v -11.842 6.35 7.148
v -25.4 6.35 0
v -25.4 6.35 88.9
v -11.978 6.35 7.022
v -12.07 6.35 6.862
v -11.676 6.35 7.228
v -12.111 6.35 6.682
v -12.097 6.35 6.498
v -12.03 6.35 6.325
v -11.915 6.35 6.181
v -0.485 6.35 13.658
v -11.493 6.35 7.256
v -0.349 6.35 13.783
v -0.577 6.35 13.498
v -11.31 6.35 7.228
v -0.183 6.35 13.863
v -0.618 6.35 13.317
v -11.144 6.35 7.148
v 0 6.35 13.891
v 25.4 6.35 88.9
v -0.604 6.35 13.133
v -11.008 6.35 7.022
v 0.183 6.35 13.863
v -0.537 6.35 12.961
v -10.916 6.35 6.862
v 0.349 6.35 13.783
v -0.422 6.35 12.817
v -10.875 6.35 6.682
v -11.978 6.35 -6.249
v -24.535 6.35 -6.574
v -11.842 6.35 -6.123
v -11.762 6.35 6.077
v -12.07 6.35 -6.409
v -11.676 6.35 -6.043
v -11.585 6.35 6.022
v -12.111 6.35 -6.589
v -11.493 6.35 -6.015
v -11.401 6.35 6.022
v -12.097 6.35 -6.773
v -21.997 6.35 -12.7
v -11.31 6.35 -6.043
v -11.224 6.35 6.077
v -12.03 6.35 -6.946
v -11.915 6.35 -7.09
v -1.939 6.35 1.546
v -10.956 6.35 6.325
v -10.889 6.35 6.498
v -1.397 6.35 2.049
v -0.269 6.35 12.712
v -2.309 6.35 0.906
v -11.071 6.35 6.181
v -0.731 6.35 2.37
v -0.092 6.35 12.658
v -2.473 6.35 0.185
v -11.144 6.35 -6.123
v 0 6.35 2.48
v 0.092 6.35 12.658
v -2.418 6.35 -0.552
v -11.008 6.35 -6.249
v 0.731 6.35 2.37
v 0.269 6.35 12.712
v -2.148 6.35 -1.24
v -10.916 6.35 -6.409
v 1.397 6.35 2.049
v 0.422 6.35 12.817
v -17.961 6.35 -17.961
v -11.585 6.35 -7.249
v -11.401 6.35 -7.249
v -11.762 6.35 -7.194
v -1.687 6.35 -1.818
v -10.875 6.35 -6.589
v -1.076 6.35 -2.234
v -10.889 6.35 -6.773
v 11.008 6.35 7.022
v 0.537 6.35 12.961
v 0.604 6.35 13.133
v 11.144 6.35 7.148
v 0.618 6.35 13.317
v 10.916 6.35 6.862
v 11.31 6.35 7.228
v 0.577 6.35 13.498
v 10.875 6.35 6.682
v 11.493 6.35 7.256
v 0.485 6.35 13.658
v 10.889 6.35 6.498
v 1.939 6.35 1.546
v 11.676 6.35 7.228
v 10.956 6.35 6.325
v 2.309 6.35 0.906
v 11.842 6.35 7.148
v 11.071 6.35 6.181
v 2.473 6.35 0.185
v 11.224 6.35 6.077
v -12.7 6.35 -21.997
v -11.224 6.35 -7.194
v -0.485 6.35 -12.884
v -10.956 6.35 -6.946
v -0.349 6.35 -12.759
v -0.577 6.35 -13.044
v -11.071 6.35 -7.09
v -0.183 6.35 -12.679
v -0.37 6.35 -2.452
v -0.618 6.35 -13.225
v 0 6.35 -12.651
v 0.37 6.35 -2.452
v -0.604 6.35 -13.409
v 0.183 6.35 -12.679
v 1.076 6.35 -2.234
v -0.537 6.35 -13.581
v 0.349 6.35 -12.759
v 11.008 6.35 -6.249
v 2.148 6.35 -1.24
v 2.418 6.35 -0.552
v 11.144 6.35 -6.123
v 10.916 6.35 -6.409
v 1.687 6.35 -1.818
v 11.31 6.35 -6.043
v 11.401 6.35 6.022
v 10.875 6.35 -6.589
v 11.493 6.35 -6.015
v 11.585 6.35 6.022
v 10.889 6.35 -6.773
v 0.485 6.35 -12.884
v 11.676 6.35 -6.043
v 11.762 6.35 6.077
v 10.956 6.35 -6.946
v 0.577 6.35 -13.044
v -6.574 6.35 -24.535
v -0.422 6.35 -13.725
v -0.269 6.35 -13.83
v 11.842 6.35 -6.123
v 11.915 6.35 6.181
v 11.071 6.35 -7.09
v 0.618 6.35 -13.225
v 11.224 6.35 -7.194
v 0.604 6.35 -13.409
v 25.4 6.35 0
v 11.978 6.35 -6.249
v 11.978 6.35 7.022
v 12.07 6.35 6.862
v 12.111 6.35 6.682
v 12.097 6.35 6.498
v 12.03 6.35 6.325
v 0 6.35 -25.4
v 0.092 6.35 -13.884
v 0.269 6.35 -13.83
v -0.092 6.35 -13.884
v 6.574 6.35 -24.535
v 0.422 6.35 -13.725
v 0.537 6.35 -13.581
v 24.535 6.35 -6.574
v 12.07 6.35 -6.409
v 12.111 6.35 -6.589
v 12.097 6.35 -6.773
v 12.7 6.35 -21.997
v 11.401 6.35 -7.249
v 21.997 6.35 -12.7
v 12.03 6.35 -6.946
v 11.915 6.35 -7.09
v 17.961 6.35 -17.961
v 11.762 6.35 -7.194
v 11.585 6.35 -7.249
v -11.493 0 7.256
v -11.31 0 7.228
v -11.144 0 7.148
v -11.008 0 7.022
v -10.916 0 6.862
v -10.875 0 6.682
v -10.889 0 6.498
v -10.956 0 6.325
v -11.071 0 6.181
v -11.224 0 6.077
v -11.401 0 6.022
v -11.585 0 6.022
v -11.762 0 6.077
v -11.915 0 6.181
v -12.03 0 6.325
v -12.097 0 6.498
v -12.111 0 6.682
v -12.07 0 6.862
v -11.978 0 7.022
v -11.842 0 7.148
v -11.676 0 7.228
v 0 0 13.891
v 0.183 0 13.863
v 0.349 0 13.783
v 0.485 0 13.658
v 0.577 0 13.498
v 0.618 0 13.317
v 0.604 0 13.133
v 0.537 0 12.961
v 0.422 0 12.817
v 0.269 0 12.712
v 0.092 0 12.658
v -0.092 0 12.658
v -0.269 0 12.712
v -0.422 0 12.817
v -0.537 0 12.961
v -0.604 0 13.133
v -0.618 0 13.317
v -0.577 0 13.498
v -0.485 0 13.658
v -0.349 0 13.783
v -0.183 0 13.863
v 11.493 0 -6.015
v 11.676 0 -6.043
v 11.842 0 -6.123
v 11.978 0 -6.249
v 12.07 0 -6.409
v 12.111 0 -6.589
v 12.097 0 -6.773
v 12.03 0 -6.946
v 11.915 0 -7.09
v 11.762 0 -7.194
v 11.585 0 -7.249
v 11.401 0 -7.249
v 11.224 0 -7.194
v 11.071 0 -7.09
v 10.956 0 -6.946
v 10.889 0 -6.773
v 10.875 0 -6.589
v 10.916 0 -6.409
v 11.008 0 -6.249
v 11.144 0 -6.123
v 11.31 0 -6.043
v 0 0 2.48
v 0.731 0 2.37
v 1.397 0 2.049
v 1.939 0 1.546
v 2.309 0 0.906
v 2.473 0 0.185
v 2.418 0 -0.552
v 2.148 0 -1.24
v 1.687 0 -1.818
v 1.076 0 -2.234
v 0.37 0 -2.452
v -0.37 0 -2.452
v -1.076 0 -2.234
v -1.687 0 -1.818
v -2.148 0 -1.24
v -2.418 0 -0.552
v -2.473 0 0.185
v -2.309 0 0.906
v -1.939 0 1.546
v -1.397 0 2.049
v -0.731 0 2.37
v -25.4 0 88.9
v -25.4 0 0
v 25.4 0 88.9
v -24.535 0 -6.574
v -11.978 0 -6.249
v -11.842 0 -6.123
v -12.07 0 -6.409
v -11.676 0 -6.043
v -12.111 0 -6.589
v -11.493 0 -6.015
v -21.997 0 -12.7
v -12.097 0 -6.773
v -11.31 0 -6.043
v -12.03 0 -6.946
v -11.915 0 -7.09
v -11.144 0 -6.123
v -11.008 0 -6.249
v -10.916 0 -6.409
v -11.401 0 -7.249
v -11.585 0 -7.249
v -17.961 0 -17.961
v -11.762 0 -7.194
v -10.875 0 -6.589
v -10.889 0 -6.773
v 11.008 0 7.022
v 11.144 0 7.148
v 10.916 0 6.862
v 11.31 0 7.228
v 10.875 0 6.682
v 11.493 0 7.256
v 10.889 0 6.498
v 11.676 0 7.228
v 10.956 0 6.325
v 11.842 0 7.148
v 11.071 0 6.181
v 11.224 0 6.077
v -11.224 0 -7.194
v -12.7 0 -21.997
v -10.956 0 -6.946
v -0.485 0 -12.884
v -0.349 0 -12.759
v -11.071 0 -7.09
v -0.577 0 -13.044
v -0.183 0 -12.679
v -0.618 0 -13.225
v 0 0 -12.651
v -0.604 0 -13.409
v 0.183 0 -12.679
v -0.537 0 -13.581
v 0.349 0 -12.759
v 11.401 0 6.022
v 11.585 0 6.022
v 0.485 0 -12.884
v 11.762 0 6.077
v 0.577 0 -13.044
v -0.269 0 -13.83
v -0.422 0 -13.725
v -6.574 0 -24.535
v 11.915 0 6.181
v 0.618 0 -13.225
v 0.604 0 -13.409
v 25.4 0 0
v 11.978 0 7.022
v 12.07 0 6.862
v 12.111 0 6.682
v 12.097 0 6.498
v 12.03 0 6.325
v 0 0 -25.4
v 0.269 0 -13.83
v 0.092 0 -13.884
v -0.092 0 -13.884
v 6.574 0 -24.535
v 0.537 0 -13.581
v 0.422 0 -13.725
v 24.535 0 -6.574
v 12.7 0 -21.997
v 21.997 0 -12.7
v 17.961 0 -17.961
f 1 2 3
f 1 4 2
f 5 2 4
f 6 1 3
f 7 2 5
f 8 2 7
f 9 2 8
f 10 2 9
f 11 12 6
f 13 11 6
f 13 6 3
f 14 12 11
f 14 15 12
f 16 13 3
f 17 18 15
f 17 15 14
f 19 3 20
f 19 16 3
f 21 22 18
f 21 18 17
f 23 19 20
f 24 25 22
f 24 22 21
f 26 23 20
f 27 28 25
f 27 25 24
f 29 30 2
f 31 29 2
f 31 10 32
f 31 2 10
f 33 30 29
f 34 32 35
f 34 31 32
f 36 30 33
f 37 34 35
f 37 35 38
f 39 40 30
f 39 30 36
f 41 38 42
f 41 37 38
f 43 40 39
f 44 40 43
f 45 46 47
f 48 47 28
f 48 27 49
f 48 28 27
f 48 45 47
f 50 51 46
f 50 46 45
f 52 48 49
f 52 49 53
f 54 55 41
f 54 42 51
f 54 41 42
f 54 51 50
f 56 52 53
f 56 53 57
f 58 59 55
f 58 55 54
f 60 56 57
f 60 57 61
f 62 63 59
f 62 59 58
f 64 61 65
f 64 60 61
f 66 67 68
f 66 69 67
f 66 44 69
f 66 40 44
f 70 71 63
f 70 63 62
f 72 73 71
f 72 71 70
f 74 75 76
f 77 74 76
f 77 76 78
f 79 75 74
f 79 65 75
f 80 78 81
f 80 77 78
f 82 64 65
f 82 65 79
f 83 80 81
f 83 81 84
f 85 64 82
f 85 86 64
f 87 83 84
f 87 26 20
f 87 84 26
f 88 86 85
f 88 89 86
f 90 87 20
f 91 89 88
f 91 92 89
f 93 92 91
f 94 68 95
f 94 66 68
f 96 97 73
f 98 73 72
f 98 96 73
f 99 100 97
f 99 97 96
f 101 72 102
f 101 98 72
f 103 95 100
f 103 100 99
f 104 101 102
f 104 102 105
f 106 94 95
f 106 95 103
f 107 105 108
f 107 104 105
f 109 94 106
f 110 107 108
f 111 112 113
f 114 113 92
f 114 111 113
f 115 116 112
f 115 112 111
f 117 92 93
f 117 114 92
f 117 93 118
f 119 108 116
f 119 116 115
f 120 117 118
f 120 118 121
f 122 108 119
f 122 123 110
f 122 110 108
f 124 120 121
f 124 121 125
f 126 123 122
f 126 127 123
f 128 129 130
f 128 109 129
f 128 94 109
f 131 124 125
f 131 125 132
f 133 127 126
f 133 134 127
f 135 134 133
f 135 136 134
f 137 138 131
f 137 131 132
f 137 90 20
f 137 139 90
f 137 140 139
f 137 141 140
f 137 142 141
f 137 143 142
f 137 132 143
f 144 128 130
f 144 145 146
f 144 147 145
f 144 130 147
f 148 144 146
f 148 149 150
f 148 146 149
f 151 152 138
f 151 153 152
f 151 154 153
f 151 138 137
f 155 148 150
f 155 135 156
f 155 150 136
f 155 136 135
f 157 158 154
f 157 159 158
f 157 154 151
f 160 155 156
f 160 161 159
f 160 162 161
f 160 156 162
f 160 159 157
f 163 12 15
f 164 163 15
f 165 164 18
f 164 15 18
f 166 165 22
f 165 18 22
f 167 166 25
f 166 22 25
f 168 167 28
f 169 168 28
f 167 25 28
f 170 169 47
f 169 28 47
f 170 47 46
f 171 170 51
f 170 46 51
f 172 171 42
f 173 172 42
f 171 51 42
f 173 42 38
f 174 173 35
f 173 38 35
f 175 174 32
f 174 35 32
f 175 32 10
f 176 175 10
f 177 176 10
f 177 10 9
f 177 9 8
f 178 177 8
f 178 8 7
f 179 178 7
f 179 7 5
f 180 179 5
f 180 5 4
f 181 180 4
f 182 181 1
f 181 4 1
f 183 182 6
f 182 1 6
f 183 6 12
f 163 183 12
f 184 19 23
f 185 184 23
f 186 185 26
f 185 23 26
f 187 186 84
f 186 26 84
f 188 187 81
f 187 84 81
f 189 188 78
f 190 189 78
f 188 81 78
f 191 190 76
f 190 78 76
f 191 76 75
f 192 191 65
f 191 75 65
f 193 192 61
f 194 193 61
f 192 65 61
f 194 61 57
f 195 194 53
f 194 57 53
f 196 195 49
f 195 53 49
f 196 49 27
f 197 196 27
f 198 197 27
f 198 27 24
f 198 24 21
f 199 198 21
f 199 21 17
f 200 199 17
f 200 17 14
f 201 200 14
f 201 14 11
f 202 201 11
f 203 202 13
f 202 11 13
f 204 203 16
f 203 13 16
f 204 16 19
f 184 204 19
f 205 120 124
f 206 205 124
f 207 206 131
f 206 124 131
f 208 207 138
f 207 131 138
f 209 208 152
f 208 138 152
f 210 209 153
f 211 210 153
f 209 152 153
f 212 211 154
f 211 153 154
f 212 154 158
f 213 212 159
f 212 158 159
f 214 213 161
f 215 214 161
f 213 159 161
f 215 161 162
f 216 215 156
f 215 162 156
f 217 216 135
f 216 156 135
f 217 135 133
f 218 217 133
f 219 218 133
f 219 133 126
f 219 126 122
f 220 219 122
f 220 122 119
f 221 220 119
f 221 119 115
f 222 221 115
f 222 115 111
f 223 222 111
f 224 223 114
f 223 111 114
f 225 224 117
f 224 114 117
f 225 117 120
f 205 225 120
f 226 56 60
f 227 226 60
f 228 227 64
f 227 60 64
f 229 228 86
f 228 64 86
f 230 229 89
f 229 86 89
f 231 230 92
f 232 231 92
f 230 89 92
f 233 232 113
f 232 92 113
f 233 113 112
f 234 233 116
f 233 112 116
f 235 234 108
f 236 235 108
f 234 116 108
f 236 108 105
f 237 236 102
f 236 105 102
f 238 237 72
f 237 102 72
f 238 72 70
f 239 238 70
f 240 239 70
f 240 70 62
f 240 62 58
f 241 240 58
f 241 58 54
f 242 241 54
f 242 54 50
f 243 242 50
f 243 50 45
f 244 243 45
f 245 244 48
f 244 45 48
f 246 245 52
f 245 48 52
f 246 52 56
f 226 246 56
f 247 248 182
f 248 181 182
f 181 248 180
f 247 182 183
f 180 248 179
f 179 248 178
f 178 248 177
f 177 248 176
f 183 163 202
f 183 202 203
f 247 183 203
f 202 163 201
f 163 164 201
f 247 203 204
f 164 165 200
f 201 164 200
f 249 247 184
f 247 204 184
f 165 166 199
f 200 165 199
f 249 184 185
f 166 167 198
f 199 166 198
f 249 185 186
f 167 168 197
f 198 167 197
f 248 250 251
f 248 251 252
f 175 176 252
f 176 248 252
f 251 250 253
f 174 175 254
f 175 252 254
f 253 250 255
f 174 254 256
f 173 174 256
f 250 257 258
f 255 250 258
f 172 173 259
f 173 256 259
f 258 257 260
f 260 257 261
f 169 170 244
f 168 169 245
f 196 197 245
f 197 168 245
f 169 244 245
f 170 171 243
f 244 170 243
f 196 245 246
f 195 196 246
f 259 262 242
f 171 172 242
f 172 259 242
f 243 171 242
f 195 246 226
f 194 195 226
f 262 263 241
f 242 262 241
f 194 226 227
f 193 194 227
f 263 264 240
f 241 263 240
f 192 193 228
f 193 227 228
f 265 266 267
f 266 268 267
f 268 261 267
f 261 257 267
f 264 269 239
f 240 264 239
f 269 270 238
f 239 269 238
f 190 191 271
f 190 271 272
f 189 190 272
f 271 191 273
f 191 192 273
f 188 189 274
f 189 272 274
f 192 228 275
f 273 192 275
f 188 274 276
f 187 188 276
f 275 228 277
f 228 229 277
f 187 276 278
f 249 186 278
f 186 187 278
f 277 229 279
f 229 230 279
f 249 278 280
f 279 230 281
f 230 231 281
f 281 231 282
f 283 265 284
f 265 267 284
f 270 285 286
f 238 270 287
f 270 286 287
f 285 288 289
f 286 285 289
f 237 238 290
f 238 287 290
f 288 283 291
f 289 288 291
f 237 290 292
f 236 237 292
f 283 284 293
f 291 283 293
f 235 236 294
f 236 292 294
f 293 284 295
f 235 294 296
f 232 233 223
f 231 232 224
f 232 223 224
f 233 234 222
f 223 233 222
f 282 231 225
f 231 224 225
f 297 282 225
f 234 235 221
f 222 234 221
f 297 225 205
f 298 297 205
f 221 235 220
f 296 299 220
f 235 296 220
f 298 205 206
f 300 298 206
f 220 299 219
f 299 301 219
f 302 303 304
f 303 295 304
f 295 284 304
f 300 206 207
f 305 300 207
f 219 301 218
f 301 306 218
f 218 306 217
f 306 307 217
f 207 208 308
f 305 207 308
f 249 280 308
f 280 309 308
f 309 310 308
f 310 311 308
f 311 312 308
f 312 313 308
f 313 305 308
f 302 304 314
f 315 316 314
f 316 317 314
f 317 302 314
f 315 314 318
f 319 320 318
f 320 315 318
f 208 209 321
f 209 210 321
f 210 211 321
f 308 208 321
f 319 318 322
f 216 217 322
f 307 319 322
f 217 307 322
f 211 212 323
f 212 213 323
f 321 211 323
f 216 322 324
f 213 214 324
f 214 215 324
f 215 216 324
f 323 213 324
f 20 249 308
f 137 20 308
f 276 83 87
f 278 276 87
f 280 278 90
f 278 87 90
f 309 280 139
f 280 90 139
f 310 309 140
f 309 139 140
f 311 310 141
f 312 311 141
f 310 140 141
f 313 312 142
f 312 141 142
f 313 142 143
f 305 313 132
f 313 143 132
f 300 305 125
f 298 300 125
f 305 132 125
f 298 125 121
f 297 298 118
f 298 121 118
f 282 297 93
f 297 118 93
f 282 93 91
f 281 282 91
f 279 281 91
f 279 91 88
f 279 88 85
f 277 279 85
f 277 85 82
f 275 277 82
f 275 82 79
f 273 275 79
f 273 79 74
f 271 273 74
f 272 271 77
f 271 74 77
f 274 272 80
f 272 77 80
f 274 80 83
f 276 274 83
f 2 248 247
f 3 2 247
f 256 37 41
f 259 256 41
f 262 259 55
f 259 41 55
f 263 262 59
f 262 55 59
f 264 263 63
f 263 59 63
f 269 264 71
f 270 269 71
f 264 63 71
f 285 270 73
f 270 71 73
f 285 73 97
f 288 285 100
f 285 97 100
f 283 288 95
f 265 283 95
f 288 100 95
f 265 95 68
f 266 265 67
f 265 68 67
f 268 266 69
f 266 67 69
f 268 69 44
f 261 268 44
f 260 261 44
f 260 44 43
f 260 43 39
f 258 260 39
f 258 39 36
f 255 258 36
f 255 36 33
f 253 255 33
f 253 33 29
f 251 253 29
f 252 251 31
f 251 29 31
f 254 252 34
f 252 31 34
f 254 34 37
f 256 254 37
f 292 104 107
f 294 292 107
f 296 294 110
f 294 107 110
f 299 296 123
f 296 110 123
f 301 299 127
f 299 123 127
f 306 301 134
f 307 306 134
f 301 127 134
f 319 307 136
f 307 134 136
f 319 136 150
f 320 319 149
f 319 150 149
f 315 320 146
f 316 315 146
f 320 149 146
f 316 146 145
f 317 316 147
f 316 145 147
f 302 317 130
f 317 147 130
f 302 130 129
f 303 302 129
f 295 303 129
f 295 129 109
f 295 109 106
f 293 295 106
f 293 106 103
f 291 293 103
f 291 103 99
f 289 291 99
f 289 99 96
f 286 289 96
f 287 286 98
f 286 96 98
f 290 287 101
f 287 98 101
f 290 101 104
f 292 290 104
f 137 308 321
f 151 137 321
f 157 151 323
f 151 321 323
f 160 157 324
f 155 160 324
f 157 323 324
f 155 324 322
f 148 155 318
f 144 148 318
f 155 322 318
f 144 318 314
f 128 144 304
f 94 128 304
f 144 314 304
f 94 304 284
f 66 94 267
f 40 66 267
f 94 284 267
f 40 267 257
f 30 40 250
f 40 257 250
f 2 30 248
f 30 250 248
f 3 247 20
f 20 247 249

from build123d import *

# Parameters (mm, degrees)
BOSS_EXTRUDE1_DEPTH = 6.35
SKETCH2_R           = 0.62000003
CUT_EXTRUDE1_DEPTH  = 6.35
SKETCH3_R           = 2.480100005
CUT_EXTRUDE2_DEPTH  = 6.35


with BuildPart() as part:
    # Sketch1 → Boss-Extrude1 (new body)
    with BuildSketch(Plane(origin=(0, 0, 0), x_dir=(1, 0, 0), z_dir=(0, 1, 0))):
        with BuildLine():
            Line((-25.4, 0), (-25.4, -88.9))
            Line((-25.4, -88.9), (25.4, -88.9))
            Line((25.4, -88.9), (25.4, 0))
            ThreePointArc((25.4, 0), (0, 25.4), (-25.4, 0))
        make_face()
    extrude(amount=BOSS_EXTRUDE1_DEPTH)

    # Sketch2 → Cut-Extrude1 (cut)
    with BuildSketch(Plane(origin=(0, 6.35, 0), x_dir=(1, 0, 0), z_dir=(0, 1, 0))):
        with Locations(Location((0, 13.271000001, 0), (0, 0, 270))):
            Circle(SKETCH2_R)
        with Locations(Location((0, -13.271000001, 0), (0, 0, 270))):
            Circle(SKETCH2_R)
        with Locations(Location((-11.493023134, 6.635500001, 0), (0, 0, 270))):
            Circle(SKETCH2_R)
        with Locations(Location((-11.493023134, -6.635500001, 0), (0, 0, 270))):
            Circle(SKETCH2_R)
        with Locations(Location((11.493023134, 6.635500001, 0), (0, 0, 270))):
            Circle(SKETCH2_R)
        with Locations(Location((11.493023134, -6.635500001, 0), (0, 0, 270))):
            Circle(SKETCH2_R)
    extrude(amount=-CUT_EXTRUDE1_DEPTH, mode=Mode.SUBTRACT)

    # Sketch3 → Cut-Extrude2 (cut)
    with BuildSketch(Plane(origin=(0, 6.35, 0), x_dir=(1, 0, 0), z_dir=(0, 1, 0))):
        with Locations(Location((0, 0, 0), (0, 0, 270))):
            Circle(SKETCH3_R)
    extrude(amount=-CUT_EXTRUDE2_DEPTH, mode=Mode.SUBTRACT)


solid = part.part
